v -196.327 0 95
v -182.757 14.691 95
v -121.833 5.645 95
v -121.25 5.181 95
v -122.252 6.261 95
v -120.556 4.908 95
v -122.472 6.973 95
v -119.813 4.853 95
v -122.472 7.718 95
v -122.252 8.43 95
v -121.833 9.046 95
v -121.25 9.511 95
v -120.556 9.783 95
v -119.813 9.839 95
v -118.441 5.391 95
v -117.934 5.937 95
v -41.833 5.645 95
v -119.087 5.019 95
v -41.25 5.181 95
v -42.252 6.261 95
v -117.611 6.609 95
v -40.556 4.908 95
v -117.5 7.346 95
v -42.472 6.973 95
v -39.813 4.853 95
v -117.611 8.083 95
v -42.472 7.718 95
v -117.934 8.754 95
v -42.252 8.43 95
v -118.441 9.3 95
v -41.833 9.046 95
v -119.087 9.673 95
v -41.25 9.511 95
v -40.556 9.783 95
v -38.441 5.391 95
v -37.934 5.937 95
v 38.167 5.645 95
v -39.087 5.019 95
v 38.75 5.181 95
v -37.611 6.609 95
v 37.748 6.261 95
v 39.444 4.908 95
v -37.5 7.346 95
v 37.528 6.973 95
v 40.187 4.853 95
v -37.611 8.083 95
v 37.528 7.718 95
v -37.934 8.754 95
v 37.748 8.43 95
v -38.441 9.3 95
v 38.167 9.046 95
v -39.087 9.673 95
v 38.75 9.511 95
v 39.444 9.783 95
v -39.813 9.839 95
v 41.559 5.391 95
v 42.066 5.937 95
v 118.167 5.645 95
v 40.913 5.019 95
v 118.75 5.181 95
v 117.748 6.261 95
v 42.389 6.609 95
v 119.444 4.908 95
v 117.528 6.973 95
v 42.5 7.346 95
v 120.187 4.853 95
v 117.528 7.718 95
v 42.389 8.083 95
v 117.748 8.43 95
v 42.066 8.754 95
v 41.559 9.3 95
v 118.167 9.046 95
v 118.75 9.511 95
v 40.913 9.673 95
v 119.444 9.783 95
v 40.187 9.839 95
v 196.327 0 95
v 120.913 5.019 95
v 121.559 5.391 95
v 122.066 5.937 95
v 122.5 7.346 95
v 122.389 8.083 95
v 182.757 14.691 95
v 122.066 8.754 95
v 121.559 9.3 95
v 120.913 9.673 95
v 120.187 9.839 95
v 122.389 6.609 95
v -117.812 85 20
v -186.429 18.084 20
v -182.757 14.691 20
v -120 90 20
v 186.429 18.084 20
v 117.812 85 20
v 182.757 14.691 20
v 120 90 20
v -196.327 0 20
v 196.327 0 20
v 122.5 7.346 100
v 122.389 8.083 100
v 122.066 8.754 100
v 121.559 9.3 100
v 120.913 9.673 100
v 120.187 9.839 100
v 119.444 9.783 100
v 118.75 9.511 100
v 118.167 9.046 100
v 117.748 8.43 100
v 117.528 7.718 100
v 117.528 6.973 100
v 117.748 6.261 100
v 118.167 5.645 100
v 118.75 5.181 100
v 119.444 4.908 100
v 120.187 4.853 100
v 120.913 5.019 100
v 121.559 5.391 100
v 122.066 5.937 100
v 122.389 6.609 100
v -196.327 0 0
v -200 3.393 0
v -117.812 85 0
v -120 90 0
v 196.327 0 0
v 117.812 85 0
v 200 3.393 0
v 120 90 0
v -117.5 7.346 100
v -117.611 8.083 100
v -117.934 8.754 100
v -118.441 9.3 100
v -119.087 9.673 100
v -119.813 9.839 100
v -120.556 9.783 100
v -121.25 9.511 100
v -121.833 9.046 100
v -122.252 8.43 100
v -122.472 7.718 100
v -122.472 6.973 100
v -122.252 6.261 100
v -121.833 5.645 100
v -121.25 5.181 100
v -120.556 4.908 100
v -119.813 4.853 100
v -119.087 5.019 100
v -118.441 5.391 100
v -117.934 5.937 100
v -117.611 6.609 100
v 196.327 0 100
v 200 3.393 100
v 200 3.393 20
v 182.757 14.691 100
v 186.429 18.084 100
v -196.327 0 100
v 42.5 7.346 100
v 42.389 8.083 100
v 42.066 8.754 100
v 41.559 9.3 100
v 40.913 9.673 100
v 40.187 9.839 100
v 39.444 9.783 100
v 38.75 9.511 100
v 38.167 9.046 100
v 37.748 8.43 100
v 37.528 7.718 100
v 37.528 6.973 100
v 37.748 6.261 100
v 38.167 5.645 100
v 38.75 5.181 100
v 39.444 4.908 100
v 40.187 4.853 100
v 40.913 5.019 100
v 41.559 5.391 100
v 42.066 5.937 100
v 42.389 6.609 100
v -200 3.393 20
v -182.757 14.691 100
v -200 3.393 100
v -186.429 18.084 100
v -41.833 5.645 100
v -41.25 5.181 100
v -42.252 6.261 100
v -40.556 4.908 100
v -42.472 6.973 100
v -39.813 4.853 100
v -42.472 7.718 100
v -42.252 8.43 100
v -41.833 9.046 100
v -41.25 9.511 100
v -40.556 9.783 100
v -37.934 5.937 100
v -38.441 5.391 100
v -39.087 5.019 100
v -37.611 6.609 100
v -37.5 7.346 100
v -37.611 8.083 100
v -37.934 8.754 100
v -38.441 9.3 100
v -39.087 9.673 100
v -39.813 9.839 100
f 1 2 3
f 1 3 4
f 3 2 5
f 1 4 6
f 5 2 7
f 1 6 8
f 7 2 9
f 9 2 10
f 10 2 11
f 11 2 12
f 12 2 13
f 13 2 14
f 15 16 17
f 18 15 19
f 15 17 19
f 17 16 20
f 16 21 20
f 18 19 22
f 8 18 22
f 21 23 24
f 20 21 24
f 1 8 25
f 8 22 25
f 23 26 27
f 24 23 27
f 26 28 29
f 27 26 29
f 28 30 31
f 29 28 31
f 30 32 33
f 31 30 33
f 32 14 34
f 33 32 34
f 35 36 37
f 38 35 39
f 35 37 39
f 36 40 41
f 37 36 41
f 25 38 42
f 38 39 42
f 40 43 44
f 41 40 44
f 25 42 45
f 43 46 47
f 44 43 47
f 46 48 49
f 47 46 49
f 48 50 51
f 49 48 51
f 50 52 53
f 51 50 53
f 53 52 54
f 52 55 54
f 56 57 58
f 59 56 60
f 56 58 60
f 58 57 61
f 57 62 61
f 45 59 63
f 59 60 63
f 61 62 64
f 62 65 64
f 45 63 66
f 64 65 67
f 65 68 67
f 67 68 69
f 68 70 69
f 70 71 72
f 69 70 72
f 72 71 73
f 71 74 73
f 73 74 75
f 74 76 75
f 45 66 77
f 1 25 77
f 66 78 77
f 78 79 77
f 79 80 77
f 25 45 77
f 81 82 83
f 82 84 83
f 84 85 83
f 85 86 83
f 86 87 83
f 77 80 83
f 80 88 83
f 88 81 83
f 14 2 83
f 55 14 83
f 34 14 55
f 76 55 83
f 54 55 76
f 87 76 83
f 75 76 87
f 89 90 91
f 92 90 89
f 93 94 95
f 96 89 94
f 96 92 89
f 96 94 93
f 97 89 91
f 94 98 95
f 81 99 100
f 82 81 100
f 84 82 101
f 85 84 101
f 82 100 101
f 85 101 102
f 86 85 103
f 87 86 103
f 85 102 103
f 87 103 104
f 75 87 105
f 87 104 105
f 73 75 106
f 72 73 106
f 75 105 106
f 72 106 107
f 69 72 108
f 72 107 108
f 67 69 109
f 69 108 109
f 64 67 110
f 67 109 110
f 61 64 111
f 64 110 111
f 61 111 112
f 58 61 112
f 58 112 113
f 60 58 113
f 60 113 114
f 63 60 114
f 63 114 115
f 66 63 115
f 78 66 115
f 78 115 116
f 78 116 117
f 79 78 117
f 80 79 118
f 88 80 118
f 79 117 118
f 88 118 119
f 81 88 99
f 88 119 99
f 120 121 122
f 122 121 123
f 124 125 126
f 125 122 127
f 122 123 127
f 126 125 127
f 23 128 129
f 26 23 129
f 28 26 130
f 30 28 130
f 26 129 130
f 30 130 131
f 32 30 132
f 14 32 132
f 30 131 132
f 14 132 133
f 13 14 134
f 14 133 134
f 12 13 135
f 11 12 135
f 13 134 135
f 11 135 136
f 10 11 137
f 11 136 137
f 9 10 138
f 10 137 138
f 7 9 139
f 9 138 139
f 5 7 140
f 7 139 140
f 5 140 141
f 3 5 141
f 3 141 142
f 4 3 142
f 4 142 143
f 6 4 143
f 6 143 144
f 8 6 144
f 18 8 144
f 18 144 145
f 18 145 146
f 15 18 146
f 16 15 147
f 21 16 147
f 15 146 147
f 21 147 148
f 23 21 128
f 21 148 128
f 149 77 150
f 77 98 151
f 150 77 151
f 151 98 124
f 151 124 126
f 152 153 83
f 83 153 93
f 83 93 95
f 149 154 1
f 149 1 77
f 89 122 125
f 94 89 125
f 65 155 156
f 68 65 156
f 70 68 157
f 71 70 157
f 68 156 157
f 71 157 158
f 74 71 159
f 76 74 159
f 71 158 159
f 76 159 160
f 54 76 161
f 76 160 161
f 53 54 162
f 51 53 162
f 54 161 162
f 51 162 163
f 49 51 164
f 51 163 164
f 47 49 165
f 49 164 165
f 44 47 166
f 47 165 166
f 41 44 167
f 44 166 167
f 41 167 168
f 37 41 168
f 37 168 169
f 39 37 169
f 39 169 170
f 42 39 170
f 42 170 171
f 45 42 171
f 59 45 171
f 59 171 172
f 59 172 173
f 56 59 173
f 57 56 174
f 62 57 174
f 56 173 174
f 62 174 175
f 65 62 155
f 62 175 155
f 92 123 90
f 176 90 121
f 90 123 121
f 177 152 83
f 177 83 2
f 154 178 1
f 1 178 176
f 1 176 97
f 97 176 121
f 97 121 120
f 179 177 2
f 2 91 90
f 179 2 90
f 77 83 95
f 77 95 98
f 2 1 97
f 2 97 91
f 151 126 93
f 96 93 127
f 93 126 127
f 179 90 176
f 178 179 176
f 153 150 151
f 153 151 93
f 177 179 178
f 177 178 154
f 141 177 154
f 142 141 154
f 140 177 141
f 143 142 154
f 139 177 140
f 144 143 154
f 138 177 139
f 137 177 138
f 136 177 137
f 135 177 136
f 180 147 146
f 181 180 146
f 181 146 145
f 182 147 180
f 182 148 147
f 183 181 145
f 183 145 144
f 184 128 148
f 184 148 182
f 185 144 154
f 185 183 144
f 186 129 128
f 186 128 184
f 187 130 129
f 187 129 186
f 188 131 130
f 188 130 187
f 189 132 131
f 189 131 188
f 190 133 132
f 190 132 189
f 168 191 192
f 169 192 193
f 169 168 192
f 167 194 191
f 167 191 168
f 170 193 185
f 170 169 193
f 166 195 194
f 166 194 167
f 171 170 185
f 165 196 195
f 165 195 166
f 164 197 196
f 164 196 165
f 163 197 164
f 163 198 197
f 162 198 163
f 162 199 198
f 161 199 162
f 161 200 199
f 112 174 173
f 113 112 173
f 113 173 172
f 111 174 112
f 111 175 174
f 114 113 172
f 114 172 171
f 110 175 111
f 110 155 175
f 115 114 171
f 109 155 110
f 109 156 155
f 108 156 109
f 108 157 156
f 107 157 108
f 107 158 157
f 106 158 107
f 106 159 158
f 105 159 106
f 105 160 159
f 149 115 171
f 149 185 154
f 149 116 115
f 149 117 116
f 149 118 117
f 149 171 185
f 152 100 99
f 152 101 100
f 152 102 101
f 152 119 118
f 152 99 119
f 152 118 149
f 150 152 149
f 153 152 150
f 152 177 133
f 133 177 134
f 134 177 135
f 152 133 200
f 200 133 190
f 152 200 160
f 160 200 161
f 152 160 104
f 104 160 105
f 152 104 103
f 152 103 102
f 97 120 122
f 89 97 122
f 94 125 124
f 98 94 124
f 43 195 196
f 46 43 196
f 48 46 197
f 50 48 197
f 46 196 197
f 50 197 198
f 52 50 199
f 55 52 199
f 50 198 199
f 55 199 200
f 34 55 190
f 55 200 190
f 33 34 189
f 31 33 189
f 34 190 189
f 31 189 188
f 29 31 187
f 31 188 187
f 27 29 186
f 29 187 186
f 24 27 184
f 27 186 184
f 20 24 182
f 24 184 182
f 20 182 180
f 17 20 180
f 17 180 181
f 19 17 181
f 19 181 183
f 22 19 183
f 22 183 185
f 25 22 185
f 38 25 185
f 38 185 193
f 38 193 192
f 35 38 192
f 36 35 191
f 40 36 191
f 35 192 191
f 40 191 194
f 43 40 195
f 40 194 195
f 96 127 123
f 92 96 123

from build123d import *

# Parameters (mm, degrees)
F1_DEPTH = 20
F3_DEPTH = 80
F4_R     = 2.5
F5_DEPTH = 5


with BuildPart() as f1:
    # F0 (on Top) → F1 (new body)
    with BuildSketch(Plane.XY):
        Polygon((-120, 90), (-200, 3.392654), (-196.32714, 0), (-117.81186, 85), (117.81186, 85), (196.32714, 0), (200, 3.392654), (120, 90), align=None)
    extrude(amount=F1_DEPTH)

    # F2 (on face) → F3 (join)
    with BuildSketch(Plane.XY.offset(20)):
        Polygon((-186.429383, 18.084093), (-200, 3.392654), (-196.32714, 0), (-182.756524, 14.691439), align=None)
        Polygon((200, 3.392654), (186.429383, 18.084093), (182.756524, 14.691439), (196.32714, 0), align=None)
    extrude(amount=F3_DEPTH)

    # F4 (on face) → F5 (join)
    with BuildSketch(Plane.XY.offset(100)):
        Polygon((196.32714, 0), (182.756524, 14.691439), (-182.756524, 14.691439), (-196.32714, 0), align=None)
        with Locations((-120, 7.345719)):
            Circle(F4_R, mode=Mode.SUBTRACT)
        with Locations((-40, 7.345719)):
            Circle(F4_R, mode=Mode.SUBTRACT)
        with Locations((40, 7.345719)):
            Circle(F4_R, mode=Mode.SUBTRACT)
        with Locations((120, 7.345719)):
            Circle(F4_R, mode=Mode.SUBTRACT)
    extrude(amount=-F5_DEPTH)


solid = f1.part
